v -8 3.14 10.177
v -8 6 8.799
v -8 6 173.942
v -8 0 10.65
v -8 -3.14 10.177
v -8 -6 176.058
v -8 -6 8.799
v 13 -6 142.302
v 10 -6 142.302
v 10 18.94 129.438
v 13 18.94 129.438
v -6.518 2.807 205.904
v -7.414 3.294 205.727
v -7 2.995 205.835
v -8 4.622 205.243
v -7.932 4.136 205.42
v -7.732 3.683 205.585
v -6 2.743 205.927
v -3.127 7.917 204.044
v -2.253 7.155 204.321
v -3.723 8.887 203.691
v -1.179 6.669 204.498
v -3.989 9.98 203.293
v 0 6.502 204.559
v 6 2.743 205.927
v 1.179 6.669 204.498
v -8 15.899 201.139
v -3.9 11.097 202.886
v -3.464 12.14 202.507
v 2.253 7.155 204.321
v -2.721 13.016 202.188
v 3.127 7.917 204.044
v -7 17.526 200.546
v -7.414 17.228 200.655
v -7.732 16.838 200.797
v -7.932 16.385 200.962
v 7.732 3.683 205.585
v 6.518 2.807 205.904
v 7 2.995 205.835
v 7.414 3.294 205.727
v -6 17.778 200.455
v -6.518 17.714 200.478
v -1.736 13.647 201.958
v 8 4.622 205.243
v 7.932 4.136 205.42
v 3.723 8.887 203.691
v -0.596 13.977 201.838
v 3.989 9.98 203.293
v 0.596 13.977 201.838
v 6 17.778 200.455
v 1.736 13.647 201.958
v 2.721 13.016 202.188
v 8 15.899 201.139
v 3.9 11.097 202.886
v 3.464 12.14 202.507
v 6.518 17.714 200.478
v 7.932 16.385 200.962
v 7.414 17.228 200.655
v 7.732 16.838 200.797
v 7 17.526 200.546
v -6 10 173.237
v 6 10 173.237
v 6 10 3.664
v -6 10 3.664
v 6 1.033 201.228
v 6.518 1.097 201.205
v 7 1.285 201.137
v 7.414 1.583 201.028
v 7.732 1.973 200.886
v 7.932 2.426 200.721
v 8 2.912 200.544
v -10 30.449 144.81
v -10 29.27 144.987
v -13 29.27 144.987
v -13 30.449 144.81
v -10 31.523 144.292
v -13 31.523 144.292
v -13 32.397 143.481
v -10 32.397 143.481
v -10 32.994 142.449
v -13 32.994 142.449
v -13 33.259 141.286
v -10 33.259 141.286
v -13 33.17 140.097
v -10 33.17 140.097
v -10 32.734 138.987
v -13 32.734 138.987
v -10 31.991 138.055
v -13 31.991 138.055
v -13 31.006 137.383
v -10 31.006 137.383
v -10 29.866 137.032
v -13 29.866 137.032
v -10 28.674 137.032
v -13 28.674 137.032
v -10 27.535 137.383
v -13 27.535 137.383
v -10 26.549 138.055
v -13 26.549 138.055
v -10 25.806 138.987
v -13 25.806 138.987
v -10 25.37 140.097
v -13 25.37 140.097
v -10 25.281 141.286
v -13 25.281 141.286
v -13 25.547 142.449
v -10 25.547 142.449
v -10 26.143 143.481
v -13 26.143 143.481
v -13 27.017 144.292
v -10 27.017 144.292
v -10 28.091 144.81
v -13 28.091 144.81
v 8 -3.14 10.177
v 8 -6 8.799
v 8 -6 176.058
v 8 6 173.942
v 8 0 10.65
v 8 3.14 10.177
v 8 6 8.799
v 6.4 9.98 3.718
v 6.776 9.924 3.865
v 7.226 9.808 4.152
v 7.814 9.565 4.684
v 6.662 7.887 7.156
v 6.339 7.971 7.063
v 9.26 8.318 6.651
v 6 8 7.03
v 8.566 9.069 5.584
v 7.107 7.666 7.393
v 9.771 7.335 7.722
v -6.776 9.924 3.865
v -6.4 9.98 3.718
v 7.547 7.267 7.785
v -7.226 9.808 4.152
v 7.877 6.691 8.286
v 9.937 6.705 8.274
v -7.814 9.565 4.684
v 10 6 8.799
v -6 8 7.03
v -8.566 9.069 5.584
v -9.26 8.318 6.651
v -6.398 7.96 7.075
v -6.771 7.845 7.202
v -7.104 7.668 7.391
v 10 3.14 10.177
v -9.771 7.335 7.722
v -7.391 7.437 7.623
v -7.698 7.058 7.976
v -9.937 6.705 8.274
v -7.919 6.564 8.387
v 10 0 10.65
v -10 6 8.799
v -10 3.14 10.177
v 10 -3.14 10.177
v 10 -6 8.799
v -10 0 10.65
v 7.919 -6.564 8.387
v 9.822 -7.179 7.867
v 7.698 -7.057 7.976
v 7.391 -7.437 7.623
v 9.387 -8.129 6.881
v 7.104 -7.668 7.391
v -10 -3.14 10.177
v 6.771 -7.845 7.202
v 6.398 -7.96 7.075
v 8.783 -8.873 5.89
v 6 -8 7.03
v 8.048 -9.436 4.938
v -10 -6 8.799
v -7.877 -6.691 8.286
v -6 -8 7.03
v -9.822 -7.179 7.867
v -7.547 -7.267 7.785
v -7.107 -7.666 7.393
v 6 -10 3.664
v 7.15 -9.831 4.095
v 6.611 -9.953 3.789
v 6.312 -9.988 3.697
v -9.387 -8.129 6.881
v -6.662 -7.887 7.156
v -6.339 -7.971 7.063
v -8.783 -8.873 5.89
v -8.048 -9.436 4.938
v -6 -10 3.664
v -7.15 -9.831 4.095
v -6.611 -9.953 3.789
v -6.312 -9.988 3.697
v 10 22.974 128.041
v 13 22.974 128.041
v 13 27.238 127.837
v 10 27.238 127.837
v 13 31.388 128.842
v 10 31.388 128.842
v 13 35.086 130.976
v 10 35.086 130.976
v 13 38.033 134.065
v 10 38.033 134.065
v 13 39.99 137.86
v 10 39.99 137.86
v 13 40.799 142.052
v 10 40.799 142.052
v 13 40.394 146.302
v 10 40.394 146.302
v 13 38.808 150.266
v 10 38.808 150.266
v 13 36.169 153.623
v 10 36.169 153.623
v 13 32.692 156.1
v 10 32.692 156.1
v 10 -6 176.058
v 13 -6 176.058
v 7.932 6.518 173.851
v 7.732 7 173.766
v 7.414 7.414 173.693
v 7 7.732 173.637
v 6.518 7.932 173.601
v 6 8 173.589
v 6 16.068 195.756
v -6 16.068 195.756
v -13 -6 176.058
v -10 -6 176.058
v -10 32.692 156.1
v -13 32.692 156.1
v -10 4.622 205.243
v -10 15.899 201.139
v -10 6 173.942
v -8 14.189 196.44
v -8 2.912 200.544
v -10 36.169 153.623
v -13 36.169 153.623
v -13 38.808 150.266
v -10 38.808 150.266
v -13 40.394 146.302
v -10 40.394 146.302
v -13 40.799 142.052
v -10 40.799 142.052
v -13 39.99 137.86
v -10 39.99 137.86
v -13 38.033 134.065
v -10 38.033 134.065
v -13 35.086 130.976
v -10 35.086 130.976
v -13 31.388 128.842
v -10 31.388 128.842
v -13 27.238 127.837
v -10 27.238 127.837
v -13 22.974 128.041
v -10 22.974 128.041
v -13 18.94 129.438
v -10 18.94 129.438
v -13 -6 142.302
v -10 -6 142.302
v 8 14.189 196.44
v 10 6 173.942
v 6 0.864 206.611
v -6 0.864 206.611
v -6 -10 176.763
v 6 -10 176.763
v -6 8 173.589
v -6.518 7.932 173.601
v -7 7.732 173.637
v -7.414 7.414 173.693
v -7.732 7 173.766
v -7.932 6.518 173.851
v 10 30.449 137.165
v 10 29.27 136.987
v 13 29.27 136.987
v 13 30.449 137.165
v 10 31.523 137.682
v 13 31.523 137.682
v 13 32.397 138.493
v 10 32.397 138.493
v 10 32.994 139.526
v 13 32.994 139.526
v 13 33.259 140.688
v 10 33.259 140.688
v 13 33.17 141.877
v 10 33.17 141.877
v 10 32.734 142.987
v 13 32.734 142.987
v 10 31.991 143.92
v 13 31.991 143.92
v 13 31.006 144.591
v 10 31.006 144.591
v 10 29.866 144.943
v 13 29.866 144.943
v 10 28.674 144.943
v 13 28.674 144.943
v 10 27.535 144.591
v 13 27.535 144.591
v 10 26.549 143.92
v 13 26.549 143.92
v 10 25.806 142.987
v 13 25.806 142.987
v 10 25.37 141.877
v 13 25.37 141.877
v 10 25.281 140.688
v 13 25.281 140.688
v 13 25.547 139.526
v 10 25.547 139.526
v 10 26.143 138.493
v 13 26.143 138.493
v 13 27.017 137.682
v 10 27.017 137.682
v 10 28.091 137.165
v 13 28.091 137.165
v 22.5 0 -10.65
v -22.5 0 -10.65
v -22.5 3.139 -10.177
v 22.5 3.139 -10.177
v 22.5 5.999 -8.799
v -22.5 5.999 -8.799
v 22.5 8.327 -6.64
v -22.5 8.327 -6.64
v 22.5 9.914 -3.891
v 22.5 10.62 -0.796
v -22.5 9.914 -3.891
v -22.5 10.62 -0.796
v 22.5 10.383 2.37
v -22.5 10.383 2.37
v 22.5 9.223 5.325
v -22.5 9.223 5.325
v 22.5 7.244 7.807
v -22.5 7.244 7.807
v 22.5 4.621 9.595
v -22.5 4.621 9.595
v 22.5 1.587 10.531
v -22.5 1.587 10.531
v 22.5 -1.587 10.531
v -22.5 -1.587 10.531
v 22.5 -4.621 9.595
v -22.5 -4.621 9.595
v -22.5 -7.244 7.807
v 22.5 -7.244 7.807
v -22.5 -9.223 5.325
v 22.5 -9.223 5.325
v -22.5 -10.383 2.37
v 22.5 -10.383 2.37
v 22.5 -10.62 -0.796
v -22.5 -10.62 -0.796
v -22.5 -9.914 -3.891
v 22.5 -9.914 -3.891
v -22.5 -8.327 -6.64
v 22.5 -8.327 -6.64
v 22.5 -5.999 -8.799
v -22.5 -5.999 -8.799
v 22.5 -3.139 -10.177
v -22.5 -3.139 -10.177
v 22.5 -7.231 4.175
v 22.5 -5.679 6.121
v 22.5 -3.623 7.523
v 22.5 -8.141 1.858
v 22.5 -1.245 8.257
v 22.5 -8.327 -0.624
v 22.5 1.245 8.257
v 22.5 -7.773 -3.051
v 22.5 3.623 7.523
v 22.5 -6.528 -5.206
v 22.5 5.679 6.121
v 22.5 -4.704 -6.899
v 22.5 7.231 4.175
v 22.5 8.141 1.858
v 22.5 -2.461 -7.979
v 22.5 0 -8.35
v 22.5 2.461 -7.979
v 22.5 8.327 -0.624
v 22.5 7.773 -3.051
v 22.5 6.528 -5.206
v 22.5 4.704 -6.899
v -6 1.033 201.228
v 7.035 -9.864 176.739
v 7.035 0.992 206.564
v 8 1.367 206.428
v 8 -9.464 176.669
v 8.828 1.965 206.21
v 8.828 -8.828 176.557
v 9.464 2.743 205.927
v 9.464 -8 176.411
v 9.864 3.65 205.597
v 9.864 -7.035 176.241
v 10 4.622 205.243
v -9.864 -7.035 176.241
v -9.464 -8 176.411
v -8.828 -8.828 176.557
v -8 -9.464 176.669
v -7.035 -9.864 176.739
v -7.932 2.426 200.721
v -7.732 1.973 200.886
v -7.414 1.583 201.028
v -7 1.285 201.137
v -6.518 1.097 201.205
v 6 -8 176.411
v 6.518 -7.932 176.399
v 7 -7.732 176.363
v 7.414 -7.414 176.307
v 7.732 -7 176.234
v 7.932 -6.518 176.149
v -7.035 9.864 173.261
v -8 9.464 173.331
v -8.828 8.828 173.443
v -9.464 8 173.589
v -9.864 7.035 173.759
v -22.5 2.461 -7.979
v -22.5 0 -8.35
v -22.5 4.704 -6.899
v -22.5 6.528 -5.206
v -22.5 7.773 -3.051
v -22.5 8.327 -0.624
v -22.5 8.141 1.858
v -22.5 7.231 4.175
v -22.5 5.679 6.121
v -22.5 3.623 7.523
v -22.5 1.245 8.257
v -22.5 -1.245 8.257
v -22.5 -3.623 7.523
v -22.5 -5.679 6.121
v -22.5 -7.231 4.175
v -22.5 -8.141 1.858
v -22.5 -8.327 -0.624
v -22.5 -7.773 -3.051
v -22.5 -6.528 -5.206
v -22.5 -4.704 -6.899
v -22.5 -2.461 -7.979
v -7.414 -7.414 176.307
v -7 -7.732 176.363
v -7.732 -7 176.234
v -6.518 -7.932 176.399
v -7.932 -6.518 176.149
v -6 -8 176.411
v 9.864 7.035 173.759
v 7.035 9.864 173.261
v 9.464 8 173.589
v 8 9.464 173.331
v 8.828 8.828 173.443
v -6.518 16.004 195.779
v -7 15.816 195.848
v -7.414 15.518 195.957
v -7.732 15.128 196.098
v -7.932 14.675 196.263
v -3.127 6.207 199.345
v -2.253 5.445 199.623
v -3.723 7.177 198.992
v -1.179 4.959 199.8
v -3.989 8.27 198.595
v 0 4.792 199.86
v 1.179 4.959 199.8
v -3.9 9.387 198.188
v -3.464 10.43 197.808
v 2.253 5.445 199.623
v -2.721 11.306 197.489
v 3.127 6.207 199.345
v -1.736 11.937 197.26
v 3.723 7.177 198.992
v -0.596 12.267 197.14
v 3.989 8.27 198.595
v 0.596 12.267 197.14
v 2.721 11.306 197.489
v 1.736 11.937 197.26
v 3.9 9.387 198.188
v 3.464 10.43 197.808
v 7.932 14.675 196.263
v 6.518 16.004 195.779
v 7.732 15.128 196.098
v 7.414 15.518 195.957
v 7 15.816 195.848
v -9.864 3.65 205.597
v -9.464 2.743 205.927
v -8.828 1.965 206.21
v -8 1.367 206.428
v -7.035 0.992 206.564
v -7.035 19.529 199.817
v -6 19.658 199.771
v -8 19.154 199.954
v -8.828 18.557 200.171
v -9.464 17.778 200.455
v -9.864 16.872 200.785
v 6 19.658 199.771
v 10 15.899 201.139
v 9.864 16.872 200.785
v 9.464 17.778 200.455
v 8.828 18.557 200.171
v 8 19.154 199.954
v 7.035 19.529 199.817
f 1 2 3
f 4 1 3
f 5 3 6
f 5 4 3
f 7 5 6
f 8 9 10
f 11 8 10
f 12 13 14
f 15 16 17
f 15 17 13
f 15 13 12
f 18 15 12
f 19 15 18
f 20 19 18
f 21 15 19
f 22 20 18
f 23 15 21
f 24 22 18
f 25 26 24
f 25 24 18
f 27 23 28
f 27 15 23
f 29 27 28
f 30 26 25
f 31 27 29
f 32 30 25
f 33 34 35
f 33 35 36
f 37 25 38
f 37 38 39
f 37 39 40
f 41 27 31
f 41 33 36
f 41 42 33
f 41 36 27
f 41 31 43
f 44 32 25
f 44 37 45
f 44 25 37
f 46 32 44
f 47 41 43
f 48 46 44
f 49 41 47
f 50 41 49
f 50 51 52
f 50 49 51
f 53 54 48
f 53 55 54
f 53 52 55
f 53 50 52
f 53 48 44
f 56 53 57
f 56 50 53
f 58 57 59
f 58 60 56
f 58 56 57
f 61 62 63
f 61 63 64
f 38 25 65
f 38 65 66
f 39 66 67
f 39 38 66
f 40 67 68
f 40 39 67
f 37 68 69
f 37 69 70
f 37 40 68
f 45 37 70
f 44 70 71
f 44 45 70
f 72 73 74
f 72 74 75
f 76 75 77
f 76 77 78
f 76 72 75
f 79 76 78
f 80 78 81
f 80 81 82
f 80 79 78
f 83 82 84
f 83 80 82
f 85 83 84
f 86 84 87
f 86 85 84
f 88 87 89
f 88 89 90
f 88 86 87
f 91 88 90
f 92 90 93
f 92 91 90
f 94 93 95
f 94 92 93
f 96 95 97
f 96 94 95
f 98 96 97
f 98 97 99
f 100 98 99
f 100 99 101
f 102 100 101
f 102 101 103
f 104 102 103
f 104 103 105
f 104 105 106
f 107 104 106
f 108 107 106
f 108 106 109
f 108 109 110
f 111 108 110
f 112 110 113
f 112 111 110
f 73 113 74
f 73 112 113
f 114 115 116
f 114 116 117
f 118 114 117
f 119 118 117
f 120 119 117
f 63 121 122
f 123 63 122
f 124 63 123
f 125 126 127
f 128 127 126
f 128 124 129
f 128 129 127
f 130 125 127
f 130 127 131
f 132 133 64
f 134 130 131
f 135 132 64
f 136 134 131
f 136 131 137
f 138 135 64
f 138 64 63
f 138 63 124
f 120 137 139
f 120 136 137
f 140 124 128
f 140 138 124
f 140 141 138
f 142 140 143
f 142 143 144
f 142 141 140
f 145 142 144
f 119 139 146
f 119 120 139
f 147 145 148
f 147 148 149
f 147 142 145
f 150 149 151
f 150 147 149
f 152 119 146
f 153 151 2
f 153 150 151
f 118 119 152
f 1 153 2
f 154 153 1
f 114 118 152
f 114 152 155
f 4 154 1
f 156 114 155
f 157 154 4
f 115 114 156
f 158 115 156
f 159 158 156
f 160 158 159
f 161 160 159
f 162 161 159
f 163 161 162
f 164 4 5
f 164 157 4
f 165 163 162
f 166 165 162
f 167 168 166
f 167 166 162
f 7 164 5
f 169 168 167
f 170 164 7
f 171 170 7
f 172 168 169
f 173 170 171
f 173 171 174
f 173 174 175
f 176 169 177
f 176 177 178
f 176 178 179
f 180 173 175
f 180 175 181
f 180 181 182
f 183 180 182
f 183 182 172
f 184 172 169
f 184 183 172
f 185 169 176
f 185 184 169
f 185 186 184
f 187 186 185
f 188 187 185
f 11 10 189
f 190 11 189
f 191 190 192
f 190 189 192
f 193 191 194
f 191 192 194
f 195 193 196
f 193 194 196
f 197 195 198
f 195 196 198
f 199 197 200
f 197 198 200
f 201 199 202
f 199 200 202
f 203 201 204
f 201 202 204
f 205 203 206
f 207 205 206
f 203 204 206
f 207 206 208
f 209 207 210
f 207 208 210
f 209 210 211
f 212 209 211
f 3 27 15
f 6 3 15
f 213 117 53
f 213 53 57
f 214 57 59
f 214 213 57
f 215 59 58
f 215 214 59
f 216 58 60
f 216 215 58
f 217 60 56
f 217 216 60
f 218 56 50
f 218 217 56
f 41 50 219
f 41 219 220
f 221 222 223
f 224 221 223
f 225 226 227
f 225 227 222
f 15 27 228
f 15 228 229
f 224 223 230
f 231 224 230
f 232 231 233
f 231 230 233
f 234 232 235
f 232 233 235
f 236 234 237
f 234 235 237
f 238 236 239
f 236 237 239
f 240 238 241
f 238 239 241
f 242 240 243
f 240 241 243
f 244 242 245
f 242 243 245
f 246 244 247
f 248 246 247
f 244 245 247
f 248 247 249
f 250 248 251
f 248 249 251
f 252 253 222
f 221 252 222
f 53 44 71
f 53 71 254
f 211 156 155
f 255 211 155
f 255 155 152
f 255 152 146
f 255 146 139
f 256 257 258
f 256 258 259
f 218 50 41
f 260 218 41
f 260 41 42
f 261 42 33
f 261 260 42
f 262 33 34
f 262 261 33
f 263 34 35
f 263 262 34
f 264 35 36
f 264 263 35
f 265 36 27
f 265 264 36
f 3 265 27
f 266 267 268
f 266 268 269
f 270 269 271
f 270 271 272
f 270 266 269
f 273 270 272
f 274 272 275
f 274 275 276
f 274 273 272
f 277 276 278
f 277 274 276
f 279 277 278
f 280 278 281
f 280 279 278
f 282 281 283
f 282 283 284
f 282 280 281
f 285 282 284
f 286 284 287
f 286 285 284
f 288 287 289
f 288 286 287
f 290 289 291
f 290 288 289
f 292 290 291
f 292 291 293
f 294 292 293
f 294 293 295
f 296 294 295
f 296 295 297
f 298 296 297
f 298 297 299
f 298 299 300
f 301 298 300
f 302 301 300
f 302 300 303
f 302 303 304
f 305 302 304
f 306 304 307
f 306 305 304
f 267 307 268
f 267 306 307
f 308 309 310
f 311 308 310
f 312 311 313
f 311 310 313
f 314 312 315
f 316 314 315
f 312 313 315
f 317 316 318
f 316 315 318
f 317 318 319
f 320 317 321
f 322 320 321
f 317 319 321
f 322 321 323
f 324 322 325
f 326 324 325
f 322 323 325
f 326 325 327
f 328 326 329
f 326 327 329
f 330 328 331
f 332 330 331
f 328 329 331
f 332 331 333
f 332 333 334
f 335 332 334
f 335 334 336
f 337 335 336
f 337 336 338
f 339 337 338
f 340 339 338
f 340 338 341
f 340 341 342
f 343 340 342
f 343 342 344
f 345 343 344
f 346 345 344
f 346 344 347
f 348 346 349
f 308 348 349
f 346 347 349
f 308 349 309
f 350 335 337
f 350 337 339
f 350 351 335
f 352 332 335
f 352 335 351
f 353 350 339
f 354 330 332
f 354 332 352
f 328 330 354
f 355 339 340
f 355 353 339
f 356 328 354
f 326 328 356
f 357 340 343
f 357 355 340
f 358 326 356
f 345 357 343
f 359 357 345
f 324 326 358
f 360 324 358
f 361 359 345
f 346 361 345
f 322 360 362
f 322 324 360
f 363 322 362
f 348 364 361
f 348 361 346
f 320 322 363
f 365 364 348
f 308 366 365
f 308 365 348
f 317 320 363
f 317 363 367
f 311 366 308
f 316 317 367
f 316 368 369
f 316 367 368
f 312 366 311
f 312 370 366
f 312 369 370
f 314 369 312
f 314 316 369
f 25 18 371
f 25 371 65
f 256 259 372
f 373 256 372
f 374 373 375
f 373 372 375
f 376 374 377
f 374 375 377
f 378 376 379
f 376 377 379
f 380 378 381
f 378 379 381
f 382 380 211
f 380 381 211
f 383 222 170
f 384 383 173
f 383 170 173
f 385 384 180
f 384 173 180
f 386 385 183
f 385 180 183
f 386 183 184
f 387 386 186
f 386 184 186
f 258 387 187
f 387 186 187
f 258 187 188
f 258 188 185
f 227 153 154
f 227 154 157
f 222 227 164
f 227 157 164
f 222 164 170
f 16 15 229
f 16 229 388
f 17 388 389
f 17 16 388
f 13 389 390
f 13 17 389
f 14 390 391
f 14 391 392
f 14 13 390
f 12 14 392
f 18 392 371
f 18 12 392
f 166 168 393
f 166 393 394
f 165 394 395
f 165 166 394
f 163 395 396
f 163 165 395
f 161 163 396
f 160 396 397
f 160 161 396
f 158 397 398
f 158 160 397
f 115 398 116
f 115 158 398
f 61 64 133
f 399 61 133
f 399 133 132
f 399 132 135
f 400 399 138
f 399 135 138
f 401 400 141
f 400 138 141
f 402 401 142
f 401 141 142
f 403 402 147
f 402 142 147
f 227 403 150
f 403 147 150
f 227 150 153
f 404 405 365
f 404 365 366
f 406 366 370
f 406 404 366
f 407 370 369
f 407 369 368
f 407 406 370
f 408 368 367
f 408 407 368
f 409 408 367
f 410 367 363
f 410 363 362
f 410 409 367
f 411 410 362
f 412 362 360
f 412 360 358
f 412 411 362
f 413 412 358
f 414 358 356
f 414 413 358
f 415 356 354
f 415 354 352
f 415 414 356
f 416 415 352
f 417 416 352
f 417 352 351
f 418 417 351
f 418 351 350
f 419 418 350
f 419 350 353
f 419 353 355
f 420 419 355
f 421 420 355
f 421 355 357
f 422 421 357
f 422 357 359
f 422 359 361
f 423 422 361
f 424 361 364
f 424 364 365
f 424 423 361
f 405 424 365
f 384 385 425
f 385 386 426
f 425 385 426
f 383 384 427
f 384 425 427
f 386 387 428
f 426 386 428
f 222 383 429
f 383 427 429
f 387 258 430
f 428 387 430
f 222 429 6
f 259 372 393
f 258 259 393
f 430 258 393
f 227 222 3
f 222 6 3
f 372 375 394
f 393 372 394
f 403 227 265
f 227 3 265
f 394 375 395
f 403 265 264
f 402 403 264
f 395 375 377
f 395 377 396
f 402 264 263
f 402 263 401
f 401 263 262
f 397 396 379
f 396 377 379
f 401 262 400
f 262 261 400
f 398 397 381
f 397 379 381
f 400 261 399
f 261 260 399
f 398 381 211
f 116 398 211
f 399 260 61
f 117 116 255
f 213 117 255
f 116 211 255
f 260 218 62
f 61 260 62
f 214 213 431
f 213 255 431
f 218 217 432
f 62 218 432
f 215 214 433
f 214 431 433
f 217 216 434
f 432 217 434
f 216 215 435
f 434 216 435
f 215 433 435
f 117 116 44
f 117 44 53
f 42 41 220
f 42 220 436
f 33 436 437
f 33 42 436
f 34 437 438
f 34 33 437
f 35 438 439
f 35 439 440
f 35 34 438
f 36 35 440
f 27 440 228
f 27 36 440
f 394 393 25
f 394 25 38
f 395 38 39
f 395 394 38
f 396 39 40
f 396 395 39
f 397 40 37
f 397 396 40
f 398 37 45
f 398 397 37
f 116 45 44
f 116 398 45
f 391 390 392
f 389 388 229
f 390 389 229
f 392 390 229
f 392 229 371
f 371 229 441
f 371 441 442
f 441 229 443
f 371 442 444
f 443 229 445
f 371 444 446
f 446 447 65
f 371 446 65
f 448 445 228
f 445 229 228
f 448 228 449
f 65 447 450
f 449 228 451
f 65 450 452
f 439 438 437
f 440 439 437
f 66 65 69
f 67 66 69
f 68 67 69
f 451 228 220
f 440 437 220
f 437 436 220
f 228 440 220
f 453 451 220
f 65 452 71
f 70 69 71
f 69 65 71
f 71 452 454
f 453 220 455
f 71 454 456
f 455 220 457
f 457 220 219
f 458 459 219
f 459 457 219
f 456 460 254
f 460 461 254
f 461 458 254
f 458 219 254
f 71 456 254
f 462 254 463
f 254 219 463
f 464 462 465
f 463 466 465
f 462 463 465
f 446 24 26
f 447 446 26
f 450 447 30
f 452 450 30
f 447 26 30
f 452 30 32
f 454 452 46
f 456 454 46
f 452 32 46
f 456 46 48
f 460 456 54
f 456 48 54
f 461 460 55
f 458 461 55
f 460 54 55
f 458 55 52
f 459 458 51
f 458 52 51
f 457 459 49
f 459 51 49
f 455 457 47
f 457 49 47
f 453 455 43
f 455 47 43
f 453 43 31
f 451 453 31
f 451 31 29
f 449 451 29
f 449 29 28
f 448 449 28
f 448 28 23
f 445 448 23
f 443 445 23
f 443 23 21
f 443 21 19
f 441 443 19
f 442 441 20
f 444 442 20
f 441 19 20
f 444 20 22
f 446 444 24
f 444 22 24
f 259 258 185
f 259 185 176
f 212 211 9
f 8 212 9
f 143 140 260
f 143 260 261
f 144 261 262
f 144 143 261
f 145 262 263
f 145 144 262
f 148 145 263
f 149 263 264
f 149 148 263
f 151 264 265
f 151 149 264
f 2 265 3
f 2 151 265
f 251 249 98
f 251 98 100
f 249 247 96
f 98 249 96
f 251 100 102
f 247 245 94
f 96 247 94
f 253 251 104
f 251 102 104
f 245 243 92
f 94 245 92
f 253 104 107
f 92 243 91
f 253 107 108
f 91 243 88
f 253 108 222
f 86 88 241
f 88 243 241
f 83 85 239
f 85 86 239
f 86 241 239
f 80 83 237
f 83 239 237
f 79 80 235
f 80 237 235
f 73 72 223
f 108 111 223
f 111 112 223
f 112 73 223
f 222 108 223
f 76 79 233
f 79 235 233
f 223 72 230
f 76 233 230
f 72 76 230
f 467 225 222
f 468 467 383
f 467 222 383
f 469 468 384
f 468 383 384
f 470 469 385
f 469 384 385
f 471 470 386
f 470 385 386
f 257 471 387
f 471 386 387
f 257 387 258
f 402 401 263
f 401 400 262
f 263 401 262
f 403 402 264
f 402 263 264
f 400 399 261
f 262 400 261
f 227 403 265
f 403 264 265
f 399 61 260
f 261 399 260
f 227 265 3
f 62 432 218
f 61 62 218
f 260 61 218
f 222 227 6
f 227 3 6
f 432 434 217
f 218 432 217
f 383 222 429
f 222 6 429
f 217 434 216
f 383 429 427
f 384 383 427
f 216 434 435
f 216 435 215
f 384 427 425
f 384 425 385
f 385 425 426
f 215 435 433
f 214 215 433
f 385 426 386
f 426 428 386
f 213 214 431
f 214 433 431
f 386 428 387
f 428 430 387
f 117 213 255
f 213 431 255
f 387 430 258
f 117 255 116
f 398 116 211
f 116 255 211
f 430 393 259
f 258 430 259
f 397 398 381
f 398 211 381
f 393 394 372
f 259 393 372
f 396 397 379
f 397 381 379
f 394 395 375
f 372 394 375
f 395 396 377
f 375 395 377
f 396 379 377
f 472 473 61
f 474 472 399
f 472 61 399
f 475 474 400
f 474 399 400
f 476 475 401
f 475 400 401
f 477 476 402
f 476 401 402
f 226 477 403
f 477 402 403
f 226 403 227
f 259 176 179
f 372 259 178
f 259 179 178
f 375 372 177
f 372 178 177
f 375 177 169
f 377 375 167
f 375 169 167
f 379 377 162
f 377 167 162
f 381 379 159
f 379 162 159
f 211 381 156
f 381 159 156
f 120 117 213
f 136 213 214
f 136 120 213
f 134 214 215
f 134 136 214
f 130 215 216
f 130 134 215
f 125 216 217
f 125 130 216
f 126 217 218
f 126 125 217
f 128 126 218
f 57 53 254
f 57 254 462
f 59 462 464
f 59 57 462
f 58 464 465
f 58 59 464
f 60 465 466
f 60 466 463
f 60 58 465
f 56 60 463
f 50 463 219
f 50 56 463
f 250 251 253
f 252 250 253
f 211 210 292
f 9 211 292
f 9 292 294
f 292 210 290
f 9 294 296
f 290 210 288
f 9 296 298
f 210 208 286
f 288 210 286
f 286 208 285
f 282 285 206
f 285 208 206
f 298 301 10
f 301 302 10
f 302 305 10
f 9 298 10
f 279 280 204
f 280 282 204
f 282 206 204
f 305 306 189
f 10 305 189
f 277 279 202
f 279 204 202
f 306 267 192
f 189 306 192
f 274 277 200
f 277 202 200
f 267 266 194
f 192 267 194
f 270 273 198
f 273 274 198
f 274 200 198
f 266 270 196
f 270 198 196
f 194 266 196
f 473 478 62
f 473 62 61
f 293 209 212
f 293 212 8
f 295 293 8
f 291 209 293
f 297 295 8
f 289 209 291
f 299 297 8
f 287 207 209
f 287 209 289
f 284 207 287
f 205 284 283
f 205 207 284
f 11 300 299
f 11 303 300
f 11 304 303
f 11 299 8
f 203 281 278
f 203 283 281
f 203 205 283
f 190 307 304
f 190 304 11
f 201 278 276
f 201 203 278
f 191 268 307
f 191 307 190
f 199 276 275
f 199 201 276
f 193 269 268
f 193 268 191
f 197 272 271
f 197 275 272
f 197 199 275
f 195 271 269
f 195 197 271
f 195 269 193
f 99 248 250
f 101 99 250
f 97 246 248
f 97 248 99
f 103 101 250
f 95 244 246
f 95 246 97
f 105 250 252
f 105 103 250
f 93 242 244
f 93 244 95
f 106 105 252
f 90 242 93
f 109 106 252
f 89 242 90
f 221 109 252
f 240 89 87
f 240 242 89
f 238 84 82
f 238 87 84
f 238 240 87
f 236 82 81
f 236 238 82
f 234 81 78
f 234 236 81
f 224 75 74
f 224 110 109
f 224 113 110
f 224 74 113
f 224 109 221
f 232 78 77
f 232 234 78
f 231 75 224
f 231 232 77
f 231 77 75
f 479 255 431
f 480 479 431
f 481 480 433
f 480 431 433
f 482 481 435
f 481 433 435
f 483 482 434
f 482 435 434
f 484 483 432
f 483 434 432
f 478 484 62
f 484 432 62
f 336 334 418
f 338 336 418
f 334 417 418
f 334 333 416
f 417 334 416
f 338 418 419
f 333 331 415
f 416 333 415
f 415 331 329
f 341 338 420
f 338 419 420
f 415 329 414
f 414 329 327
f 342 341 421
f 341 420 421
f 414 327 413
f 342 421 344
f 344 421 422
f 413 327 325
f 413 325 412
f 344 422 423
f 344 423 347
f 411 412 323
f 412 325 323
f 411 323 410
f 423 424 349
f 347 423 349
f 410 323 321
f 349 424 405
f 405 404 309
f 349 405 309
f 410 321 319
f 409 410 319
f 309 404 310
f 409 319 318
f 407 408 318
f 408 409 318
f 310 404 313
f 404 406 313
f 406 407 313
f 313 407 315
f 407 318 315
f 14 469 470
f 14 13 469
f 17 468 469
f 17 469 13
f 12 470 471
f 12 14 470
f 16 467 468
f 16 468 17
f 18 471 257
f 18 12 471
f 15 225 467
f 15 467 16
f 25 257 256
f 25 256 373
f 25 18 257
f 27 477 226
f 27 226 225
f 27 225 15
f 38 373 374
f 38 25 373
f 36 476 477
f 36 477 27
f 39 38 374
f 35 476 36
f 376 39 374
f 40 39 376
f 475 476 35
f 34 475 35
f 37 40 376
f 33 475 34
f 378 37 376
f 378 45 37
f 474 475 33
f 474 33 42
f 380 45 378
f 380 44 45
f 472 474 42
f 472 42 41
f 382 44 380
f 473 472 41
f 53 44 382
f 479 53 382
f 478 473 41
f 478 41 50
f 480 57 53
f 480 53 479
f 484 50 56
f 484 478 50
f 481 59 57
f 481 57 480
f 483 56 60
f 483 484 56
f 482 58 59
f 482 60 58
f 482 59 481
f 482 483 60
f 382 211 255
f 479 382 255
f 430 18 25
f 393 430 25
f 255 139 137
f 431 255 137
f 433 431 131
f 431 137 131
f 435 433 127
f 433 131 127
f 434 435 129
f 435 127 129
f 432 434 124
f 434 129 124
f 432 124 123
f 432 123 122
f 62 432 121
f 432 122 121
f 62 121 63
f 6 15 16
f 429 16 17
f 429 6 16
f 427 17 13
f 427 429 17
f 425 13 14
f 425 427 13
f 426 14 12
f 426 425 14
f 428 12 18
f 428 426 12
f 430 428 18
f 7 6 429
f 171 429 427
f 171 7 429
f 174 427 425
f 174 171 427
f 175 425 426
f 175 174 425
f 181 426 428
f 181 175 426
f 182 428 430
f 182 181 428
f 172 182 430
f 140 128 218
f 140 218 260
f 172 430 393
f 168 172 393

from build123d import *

# Parameters (mm, degrees)
SQUARE_TUBE_20_X_20_X_2_1_DEPTH   = 178.493640075
SQUARE_TUBE_20_X_20_X_2_1_2_DEPTH = 33.493640075
SKETCH15_R                        = 10.65
SKETCH15_R_2                      = 8.35
PIPE_21_3_X_2_3_1_DEPTH           = 45
SKETCH16_R                        = 4
BOSS_EXTRUDE1_DEPTH               = 3
SKETCH17_R                        = 4
BOSS_EXTRUDE2_DEPTH               = 3
SKETCH18_R                        = 4
BOSS_EXTRUDE3_DEPTH               = 5


with BuildPart() as part:
    # Sketch14 → Square tube 20 X 20 X 2(1) (new body)
    with BuildSketch(Plane.XY):
        with BuildLine():
            Line((-6, -10), (6, -10))
            ThreePointArc((6, -10), (8.828427125, -8.828427125), (10, -6))
            Line((10, -6), (10, 6))
            ThreePointArc((10, 6), (8.828427125, 8.828427125), (6, 10))
            Line((6, 10), (-6, 10))
            ThreePointArc((-6, 10), (-8.828427125, 8.828427125), (-10, 6))
            Line((-10, 6), (-10, -6))
            ThreePointArc((-10, -6), (-8.828427125, -8.828427125), (-6, -10))
        make_face()
        with BuildLine():
            Line((-6, -8), (6, -8))
            ThreePointArc((6, -8), (7.414213562, -7.414213562), (8, -6))
            Line((8, -6), (8, 6))
            ThreePointArc((8, 6), (7.414213562, 7.414213562), (6, 8))
            Line((6, 8), (-6, 8))
            ThreePointArc((-6, 8), (-7.414213562, 7.414213562), (-8, 6))
            Line((-8, 6), (-8, -6))
            ThreePointArc((-8, -6), (-7.414213562, -7.414213562), (-6, -8))
        make_face(mode=Mode.SUBTRACT)
    extrude(amount=SQUARE_TUBE_20_X_20_X_2_1_DEPTH)

    # Square tube 20 X 20 X 2(1) mitre 1
    split(bisect_by=Plane(origin=(0, 0, 175), x_dir=(0, 0.984807753, -0.173648178), z_dir=(0, -0.173648178, -0.984807753)), keep=Keep.TOP)


with BuildPart() as body_2:
    # Sketch14 on segment 2 (carried to segment 2) → Square tube 20 X 20 X 2_1 2 (new body)
    with BuildSketch(Plane(origin=(0, -1.194895279, 171.717052202), x_dir=(1, 0, 0), z_dir=(0, 0.342020143, 0.939692621))):
        with BuildLine():
            Line((-6, -10), (6, -10))
            ThreePointArc((6, -10), (8.828427125, -8.828427125), (10, -6))
            Line((10, -6), (10, 6))
            ThreePointArc((10, 6), (8.828427125, 8.828427125), (6, 10))
            Line((6, 10), (-6, 10))
            ThreePointArc((-6, 10), (-8.828427125, 8.828427125), (-10, 6))
            Line((-10, 6), (-10, -6))
            ThreePointArc((-10, -6), (-8.828427125, -8.828427125), (-6, -10))
        make_face()
        with BuildLine():
            Line((-6, -8), (6, -8))
            ThreePointArc((6, -8), (7.414213562, -7.414213562), (8, -6))
            Line((8, -6), (8, 6))
            ThreePointArc((8, 6), (7.414213562, 7.414213562), (6, 8))
            Line((6, 8), (-6, 8))
            ThreePointArc((-6, 8), (-7.414213562, 7.414213562), (-8, 6))
            Line((-8, 6), (-8, -6))
            ThreePointArc((-8, -6), (-7.414213562, -7.414213562), (-6, -8))
        make_face(mode=Mode.SUBTRACT)
    extrude(amount=SQUARE_TUBE_20_X_20_X_2_1_2_DEPTH)

    # Square tube 20 X 20 X 2_1 2 mitre 1
    split(bisect_by=Plane(origin=(0, 0, 175), x_dir=(0, -0.984807753, 0.173648178), z_dir=(0, 0.173648178, 0.984807753)), keep=Keep.TOP)


with BuildPart() as body_3:
    # Sketch15 → Pipe 21.3 X 2.3(1) (new body)
    with BuildSketch(Plane(origin=(-22.5, 0, 0), x_dir=(0, 0, -1), z_dir=(1, 0, 0))):
        Circle(SKETCH15_R)
        Circle(SKETCH15_R_2, mode=Mode.SUBTRACT)
    extrude(amount=PIPE_21_3_X_2_3_1_DEPTH)


with BuildPart() as part_1:
    add(part.part)

    # Trim/Extend1: cut back where it meets the other member's skin (coped)
    split(bisect_by=body_3.part.faces().sort_by_distance((0, 0, 10.65))[0], keep=Keep.TOP)


with BuildPart() as body_4:
    # Sketch16 → Boss-Extrude1 (new body)
    with BuildSketch(Plane.ZY.offset(10)):
        with BuildLine():
            Line((176.057961884, -6), (156.100051786, 32.692198121))
            ThreePointArc((156.100051786, 32.692198121), (135.89271229, 39.146919686), (129.437990725, 18.939580189))
            Line((129.437990725, 18.939580189), (142.302131908, -6))
            Line((142.302131908, -6), (176.057961884, -6))
        make_face()
        with Locations((140.987329124, 29.27003764)):
            Circle(SKETCH16_R, mode=Mode.SUBTRACT)
    extrude(amount=BOSS_EXTRUDE1_DEPTH)


with BuildPart() as body_5:
    # Sketch17 → Boss-Extrude2 (new body)
    with BuildSketch(Plane(origin=(10, 0, 0), x_dir=(0, 0, -1), z_dir=(1, 0, 0))):
        with BuildLine():
            Line((-156.100051786, 32.692198121), (-176.057961884, -6))
            Line((-176.057961884, -6), (-142.302131908, -6))
            Line((-142.302131908, -6), (-129.437990725, 18.939580189))
            ThreePointArc((-129.437990725, 18.939580189), (-135.89271229, 39.146919686), (-156.100051786, 32.692198121))
        make_face()
        with Locations((-140.987329124, 29.27003764)):
            Circle(SKETCH17_R, mode=Mode.SUBTRACT)
    extrude(amount=BOSS_EXTRUDE2_DEPTH)


with BuildPart() as body_6:
    # Sketch18 → Boss-Extrude3 (new body)
    with BuildSketch(Plane(origin=(0, 66.504520147, 182.719667396), x_dir=(1, 0, 0), z_dir=(0, 0.3420201433256697, 0.9396926207859081))):
        with BuildLine():
            Line((8, -65.853525082), (8, -53.853525082))
            ThreePointArc((8, -53.853525082), (7.414213562, -52.43931152), (6, -51.853525082))
            Line((6, -51.853525082), (-6, -51.853525082))
            ThreePointArc((-6, -51.853525082), (-7.414213562, -52.43931152), (-8, -53.853525082))
            Line((-8, -53.853525082), (-8, -65.853525082))
            ThreePointArc((-8, -65.853525082), (-7.414213562, -67.267738644), (-6, -67.853525082))
            Line((-6, -67.853525082), (6, -67.853525082))
            ThreePointArc((6, -67.853525082), (7.414213562, -67.267738644), (8, -65.853525082))
        make_face()
        with Locations(Location((0, -59.853525082, 0), (0, 0, 270))):
            Circle(SKETCH18_R, mode=Mode.SUBTRACT)
    extrude(amount=-BOSS_EXTRUDE3_DEPTH)


solid = Compound([body_2.part, body_3.part, part_1.part, body_4.part, body_5.part, body_6.part])
